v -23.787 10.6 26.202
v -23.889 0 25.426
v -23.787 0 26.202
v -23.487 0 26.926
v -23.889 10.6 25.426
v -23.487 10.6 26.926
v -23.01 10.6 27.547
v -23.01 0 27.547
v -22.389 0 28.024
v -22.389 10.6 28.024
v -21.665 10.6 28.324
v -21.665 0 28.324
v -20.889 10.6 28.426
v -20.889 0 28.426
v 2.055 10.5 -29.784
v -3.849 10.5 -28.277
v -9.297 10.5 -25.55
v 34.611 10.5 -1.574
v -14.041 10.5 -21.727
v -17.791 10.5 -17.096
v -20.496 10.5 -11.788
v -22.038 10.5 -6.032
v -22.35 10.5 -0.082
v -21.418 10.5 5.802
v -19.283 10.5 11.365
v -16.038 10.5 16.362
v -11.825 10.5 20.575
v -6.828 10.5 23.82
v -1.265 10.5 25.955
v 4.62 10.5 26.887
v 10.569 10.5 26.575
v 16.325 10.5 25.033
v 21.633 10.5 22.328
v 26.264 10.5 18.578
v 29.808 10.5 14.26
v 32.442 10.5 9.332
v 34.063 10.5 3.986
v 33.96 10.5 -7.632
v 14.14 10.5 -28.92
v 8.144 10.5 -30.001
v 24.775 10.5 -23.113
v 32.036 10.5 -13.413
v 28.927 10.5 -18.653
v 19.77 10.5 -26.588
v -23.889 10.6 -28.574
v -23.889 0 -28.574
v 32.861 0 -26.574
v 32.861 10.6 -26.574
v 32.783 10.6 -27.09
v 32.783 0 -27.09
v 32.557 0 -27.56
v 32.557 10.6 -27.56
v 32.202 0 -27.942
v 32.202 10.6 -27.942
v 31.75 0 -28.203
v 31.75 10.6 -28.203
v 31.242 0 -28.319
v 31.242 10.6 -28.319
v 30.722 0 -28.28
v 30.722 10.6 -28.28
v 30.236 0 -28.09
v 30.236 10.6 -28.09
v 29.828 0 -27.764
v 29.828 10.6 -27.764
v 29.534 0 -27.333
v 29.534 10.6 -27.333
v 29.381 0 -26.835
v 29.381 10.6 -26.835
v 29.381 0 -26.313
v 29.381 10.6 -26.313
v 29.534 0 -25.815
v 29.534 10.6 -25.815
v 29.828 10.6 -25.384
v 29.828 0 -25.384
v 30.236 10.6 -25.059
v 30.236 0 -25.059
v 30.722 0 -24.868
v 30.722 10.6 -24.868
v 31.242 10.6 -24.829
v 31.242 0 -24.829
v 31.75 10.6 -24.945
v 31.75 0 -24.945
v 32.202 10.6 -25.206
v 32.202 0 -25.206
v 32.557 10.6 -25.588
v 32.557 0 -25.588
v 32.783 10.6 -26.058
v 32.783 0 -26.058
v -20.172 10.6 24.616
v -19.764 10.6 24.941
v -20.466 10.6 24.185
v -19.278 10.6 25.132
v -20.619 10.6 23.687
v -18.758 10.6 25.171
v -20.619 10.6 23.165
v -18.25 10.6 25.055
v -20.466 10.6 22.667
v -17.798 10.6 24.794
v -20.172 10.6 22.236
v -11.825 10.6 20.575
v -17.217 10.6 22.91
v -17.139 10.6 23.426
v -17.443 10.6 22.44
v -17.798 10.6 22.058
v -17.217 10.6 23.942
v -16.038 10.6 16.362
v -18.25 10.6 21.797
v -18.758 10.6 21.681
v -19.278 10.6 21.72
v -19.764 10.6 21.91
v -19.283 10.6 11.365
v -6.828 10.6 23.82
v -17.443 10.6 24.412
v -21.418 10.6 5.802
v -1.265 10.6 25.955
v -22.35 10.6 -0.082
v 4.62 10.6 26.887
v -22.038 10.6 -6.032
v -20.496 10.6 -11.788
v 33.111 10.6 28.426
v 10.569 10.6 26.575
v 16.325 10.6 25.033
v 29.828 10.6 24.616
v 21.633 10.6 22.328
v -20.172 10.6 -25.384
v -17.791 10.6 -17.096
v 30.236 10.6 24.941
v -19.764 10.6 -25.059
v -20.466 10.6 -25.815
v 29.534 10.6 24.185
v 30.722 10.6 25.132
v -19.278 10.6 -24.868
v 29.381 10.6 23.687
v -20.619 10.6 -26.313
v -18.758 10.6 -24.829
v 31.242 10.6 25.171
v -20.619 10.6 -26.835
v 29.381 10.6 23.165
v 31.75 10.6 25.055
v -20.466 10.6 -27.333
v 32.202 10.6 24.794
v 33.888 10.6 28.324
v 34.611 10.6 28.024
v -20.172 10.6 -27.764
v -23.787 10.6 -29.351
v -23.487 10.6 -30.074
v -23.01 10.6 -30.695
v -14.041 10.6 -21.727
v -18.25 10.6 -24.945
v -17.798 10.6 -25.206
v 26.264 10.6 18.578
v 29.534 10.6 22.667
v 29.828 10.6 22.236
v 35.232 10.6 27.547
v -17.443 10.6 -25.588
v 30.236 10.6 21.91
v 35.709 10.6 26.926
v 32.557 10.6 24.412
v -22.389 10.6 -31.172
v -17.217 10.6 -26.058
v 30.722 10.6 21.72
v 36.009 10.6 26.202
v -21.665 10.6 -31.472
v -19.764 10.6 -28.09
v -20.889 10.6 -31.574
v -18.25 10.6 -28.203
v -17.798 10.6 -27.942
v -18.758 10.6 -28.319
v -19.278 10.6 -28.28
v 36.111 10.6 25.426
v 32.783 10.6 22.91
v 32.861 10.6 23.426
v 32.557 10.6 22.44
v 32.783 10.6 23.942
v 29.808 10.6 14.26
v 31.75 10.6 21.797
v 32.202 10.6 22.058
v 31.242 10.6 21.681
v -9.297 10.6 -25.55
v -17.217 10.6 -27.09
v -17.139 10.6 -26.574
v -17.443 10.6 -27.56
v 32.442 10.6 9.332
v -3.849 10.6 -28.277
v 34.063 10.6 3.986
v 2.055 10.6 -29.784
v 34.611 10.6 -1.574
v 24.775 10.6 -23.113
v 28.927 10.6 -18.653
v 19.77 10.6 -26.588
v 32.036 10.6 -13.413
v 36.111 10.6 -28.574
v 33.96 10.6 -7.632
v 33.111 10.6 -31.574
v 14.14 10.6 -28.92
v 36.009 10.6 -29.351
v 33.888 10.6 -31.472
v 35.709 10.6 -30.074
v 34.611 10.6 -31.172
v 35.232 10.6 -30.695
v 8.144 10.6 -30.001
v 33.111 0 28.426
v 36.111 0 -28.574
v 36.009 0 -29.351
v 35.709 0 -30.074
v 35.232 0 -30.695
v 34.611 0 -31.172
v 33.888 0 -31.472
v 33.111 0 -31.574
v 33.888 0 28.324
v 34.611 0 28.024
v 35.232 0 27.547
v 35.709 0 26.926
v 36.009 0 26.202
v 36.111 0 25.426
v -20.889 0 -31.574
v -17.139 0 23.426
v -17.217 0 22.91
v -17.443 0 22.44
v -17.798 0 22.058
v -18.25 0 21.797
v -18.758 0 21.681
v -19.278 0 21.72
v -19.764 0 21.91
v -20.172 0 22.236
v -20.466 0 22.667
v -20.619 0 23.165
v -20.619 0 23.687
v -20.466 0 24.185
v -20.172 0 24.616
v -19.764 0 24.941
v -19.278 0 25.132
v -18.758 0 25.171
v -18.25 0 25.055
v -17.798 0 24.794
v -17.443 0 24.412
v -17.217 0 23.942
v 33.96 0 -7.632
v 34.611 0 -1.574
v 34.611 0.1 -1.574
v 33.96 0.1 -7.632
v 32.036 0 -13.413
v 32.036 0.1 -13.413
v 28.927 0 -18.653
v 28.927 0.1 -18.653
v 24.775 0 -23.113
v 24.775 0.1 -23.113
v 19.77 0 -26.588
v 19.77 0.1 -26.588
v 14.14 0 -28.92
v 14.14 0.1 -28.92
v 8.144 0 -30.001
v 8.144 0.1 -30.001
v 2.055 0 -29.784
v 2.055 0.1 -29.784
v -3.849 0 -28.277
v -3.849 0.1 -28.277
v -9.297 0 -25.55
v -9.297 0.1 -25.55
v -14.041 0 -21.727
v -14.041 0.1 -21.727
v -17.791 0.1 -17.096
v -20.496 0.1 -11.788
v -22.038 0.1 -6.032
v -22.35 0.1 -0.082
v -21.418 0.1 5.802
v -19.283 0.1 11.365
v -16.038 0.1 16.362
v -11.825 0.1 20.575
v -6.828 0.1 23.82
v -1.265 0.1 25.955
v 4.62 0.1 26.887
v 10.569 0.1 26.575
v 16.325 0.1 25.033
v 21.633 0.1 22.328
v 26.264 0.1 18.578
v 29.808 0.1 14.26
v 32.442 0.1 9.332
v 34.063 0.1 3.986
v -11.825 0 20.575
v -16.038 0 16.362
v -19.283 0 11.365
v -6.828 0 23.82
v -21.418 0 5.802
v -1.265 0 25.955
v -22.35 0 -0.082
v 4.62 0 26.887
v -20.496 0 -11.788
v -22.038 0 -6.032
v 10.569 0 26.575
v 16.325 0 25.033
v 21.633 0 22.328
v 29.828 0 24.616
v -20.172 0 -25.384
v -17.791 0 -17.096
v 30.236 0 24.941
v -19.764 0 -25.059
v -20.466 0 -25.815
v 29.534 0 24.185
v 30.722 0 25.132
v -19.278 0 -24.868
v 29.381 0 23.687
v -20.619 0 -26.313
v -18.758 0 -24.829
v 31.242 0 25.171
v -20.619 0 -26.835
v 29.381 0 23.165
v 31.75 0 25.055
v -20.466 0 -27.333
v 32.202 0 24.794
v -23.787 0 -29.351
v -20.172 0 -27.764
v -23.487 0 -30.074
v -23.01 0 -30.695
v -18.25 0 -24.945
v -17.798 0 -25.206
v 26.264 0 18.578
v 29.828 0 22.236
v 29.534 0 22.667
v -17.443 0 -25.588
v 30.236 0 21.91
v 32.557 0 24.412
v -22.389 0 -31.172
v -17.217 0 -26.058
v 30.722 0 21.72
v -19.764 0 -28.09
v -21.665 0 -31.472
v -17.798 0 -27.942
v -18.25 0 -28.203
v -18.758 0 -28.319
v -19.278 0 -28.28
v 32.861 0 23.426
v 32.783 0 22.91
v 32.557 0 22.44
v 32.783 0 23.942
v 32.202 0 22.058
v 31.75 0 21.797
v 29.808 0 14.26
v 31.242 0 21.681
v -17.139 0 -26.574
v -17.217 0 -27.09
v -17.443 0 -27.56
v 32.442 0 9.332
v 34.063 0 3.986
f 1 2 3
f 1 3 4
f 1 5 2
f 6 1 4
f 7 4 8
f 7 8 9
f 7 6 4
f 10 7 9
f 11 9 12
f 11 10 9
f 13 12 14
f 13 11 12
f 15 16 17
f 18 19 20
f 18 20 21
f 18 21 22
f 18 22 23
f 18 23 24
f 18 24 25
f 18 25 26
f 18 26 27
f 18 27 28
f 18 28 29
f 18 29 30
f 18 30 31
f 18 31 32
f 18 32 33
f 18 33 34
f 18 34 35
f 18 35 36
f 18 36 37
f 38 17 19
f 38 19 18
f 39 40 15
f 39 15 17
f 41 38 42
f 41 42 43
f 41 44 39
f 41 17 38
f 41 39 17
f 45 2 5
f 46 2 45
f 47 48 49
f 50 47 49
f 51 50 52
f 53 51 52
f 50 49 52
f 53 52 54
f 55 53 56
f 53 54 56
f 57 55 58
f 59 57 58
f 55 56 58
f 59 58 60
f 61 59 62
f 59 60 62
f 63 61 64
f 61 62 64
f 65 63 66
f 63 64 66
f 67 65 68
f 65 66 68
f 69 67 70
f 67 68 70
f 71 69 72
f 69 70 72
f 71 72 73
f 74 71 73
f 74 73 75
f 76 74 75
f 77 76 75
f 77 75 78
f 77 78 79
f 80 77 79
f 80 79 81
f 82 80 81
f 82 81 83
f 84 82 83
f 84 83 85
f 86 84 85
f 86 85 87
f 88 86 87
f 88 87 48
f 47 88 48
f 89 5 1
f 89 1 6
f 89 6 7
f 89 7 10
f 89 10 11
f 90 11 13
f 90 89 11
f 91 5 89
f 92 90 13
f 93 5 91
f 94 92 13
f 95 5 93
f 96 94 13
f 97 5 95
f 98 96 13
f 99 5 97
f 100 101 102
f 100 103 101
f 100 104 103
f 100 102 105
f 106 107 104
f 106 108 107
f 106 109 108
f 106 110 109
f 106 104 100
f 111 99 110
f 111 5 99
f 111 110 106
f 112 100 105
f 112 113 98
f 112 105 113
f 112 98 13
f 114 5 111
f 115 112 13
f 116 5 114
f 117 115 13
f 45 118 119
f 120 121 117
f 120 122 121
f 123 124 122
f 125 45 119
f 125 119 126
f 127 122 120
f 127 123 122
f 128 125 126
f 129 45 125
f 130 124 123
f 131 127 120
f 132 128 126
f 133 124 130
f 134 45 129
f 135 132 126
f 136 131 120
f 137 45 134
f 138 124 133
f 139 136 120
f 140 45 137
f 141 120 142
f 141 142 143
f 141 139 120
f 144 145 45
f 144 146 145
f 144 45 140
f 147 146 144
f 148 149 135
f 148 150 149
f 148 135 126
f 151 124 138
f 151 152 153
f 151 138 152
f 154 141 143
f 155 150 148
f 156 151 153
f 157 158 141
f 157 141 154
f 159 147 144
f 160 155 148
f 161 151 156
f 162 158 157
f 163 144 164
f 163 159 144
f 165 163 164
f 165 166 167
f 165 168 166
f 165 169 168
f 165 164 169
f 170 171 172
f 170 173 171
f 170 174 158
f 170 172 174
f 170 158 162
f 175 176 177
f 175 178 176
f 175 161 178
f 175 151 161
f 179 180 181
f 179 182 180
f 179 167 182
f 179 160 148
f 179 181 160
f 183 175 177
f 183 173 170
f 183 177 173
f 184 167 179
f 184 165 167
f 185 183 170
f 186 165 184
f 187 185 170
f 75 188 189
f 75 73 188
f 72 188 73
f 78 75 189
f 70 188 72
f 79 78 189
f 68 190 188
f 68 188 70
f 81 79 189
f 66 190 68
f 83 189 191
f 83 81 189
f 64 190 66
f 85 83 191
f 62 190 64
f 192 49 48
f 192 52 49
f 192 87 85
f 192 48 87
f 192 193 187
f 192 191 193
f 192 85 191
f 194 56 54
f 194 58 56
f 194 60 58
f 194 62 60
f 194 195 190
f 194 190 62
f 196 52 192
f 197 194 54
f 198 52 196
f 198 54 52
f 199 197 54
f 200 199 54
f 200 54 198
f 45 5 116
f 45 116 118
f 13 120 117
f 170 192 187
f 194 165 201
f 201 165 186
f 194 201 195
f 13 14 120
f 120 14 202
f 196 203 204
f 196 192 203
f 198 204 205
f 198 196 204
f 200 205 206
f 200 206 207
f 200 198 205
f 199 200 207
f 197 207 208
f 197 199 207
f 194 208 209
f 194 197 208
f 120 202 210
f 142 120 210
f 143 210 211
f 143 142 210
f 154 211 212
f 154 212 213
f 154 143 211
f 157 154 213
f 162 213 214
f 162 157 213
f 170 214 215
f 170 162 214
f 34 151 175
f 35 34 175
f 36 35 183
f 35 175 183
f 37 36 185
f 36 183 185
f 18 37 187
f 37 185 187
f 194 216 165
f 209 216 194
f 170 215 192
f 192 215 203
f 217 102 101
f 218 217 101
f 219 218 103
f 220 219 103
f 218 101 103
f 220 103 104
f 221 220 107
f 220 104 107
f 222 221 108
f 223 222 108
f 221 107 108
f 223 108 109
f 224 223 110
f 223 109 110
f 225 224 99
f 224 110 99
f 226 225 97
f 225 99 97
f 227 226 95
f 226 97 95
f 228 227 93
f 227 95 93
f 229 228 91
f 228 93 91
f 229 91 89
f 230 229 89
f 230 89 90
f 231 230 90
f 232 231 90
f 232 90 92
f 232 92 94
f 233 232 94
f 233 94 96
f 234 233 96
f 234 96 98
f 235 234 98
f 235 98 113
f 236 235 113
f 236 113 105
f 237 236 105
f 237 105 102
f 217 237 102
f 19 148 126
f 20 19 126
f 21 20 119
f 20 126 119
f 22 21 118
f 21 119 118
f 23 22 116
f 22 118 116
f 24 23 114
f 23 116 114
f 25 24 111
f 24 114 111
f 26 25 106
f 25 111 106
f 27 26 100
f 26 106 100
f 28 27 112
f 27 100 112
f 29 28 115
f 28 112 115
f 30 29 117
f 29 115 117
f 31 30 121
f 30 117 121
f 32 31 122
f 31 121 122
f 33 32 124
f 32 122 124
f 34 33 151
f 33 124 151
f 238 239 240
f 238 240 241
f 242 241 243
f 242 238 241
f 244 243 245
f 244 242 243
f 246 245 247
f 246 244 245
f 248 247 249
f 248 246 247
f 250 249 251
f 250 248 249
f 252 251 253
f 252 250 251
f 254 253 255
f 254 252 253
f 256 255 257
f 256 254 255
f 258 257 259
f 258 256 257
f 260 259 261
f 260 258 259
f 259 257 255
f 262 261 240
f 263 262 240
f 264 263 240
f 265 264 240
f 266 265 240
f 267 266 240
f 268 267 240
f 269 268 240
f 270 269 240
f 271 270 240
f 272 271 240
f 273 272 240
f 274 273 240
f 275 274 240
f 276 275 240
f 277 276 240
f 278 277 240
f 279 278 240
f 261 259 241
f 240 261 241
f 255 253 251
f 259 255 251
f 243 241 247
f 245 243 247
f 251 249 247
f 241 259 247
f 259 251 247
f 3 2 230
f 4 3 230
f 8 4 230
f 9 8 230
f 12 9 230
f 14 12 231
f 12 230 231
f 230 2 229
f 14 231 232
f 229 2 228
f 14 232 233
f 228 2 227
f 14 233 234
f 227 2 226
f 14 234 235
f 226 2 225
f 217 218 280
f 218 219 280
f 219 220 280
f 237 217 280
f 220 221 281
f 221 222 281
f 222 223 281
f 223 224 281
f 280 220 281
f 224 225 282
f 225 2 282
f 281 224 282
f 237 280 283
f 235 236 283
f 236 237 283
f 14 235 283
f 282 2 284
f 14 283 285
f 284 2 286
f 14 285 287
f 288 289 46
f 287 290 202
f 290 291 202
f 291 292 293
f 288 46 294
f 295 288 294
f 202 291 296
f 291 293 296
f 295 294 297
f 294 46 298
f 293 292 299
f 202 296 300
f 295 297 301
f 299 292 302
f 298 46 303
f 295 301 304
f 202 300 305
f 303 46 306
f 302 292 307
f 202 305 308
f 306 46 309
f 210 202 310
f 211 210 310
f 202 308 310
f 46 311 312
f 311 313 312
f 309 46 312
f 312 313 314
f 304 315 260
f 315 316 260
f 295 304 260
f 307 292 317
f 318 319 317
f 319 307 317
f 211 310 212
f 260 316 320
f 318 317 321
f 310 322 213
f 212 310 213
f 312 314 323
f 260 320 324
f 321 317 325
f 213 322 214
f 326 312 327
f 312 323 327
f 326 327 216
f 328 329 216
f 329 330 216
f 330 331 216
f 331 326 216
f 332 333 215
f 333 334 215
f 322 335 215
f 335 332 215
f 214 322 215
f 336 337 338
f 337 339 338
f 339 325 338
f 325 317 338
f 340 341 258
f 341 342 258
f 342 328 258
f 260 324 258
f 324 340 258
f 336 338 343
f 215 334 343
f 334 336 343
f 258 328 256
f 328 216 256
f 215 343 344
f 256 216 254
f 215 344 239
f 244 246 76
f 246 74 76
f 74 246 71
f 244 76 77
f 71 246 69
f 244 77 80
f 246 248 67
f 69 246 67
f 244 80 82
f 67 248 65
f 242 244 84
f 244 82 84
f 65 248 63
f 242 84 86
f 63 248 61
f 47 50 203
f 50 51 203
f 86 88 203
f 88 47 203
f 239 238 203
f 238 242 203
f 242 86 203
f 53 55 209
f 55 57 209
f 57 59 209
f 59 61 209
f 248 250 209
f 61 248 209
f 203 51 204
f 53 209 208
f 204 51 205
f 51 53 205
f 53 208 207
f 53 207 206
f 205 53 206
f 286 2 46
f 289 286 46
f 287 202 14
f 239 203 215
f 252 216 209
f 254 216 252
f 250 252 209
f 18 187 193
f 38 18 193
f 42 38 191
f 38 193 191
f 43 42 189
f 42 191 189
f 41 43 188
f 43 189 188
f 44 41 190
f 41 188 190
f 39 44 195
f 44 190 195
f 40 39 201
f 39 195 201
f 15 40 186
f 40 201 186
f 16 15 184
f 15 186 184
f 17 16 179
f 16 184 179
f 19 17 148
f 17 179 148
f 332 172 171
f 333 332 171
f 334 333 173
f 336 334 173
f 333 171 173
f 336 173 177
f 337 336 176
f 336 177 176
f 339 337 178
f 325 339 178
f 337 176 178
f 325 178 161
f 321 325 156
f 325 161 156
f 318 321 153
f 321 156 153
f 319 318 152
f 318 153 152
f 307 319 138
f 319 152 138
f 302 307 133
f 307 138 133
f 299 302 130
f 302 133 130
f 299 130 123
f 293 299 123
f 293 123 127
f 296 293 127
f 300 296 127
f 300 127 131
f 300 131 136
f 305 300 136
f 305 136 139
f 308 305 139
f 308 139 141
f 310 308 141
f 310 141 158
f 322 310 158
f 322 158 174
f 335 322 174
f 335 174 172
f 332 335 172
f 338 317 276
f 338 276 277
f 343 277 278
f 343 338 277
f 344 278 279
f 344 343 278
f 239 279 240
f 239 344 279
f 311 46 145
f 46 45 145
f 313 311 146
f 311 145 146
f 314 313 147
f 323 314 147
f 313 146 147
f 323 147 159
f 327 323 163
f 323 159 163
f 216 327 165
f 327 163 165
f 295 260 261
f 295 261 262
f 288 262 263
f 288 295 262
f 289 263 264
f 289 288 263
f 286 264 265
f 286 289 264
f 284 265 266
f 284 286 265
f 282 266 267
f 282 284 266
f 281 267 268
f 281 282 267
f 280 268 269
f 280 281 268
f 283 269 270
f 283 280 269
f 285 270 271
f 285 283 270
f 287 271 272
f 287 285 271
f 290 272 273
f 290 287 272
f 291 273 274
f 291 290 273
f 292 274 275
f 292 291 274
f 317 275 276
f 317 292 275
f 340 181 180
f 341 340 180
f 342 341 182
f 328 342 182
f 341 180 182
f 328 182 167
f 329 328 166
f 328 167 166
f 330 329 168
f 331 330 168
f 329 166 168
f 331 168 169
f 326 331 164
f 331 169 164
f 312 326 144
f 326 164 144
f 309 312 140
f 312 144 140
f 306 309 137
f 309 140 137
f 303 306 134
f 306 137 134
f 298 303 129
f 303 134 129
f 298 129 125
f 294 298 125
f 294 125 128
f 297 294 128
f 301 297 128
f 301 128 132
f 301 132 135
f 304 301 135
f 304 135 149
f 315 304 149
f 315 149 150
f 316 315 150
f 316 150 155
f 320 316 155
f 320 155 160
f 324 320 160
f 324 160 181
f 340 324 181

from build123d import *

# Parameters (mm, degrees)
SKETCH1_W           = 60
SKETCH1_H           = 60
BOSS_EXTRUDE1_DEPTH = 10.6
FILLET1_R           = 3
SKETCH2_R           = 1.75
CUT_EXTRUDE1_DEPTH  = 11.6
CUT_EXTRUDE2_DEPTH  = 0.1
CUT_EXTRUDE3_START  = -10.6
CUT_EXTRUDE3_DEPTH  = 0.1


with BuildPart() as part:
    # Sketch1 → Boss-Extrude1 (new body)
    with BuildSketch(Plane(origin=(0, 0, 0), x_dir=(1, 0, 0), z_dir=(0, 1, 0))):
        with Locations((6.111111111, 1.574074074)):
            Rectangle(SKETCH1_W, SKETCH1_H)
    extrude(amount=BOSS_EXTRUDE1_DEPTH)

    # Fillet1
    fillet1_edges = [part.edges().sort_by_distance(p)[0] for p in [
        (-23.888888889, 5.3, -31.574074074),
        (36.111111111, 5.3, -31.574074074),
        (36.111111111, 5.3, 28.425925926),
        (-23.888888889, 5.3, 28.425925926),
    ]]
    fillet(fillet1_edges, radius=FILLET1_R)

    # Sketch2 → Cut-Extrude1 (cut, through all)
    with BuildSketch(Plane(origin=(0, 10.6, 0), x_dir=(1, 0, 0), z_dir=(0, 1, 0))):
        with Locations((-18.888888889, 26.574074074)):
            Circle(SKETCH2_R)
        with Locations((31.111111111, 26.574074074)):
            Circle(SKETCH2_R)
        with Locations((31.111111111, -23.425925926)):
            Circle(SKETCH2_R)
        with Locations((-18.888888889, -23.425925926)):
            Circle(SKETCH2_R)
    extrude(amount=-CUT_EXTRUDE1_DEPTH, mode=Mode.SUBTRACT)

    # Sketch3 → Cut-Extrude2 (cut)
    with BuildSketch(Plane(origin=(0, 10.6, 0), x_dir=(1, 0, 0), z_dir=(0, 1, 0))):
        with BuildLine():
            ThreePointArc((34.611111111, 1.574074074), (17.017588934, 27.904640751), (-14.041432153, 21.726617338))
            Line((-14.041432153, 21.726617338), (26.263654375, -18.57846919))
            ThreePointArc((26.263654375, -18.57846919), (32.441677788, -9.332403748), (34.611111111, 1.574074074))
        make_face()
        with BuildLine():
            Line((26.263654375, -18.57846919), (-14.041432153, 21.726617338))
            ThreePointArc((-14.041432153, 21.726617338), (-14.041432153, -18.57846919), (26.263654375, -18.57846919))
        make_face()
    extrude(amount=-CUT_EXTRUDE2_DEPTH, mode=Mode.SUBTRACT)

    # Sketch3<3> → Cut-Extrude3 (cut)
    with BuildSketch(Plane(origin=(0, 10.6, 0), x_dir=(1, 0, 0), z_dir=(0, 1, 0)).offset(CUT_EXTRUDE3_START)):
        with BuildLine():
            ThreePointArc((34.611111111, 1.574074074), (17.017588934, 27.904640751), (-14.041432153, 21.726617338))
            Line((-14.041432153, 21.726617338), (26.263654375, -18.57846919))
            ThreePointArc((26.263654375, -18.57846919), (32.441677788, -9.332403748), (34.611111111, 1.574074074))
        make_face()
        with BuildLine():
            Line((26.263654375, -18.57846919), (-14.041432153, 21.726617338))
            ThreePointArc((-14.041432153, 21.726617338), (-14.041432153, -18.57846919), (26.263654375, -18.57846919))
        make_face()
    extrude(amount=CUT_EXTRUDE3_DEPTH, mode=Mode.SUBTRACT)


solid = part.part
